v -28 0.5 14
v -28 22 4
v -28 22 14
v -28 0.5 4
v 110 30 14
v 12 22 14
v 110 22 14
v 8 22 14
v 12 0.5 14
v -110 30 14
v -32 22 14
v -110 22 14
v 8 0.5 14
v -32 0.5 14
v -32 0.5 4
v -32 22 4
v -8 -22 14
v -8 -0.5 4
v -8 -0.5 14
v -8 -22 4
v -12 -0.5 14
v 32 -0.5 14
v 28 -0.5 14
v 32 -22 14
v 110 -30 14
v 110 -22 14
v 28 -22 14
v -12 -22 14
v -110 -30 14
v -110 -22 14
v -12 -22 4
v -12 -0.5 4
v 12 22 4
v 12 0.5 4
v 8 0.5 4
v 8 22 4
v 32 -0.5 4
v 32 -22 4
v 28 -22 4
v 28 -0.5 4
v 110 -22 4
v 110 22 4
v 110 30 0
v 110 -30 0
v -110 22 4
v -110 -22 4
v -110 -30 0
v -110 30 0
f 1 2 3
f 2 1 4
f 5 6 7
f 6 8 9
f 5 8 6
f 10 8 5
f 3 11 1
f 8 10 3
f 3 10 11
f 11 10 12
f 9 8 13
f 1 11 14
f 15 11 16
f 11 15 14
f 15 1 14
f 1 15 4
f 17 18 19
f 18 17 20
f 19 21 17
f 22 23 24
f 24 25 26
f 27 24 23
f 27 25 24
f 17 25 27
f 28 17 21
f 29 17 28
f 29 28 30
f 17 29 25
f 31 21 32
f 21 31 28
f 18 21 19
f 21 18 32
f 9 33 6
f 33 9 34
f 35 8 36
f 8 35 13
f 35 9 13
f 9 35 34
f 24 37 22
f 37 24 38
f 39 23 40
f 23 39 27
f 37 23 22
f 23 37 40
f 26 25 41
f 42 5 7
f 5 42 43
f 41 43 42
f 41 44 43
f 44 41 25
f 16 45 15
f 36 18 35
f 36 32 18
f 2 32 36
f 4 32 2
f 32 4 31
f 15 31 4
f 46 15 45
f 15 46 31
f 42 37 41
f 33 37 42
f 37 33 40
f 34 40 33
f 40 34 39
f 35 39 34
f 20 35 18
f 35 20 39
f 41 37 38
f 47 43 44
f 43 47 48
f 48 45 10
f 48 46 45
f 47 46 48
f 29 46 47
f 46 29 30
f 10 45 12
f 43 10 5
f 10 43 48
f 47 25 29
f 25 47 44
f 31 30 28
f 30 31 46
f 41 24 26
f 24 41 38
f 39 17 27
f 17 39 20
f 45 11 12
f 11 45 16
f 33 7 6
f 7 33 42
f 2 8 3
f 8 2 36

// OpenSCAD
$fn = 32;

// ----------------------------------------------------------------------
// Rib frame 220 x 60 x 14
// 4 ribs at 20 mm pitch, staggered
// ----------------------------------------------------------------------

// --- parameters (mm) ---
frame = [220, 60, 4];  // base plate size (x, y, z)
rail_w = 8;            // side rail width
ribs = 4;              // number of ribs
rib_t = 4;             // rib thickness
rib_h = 10;            // rib height above the base plate
pitch = 20;            // pitch between rib centres

// --- derived feature positions (mm) ---
span = (ribs - 1) * pitch;          // = 60   distance between the outer ribs
origin_x = -span / 2;               // = -30   X of the first rib
rib_len = frame[1] / 2 - rail_w + 0.5;  // = 22.5   length of a staggered rib
rib_y = 0.5 + rib_len / 2;          // = 11.75   Y of a staggered rib centre
row_offset = 2 * rib_y;             // = 23.5   distance between the two rows
feature_centers = [
  [origin_x + 0 * pitch, rib_y],
  [origin_x + 1 * pitch, -rib_y],
  [origin_x + 2 * pitch, rib_y],
  [origin_x + 3 * pitch, -rib_y]
];   // rib centre line, drives the rib loop

// base plate, two side rails, then the ribs read straight off feature_centers
union() {
  translate([-frame[0] / 2, -frame[1] / 2, 0]) cube(frame);
  translate([-frame[0] / 2, -frame[1] / 2, 0]) cube([frame[0], rail_w, frame[2] + rib_h]);
  translate([-frame[0] / 2, frame[1] / 2 - rail_w, 0]) cube([frame[0], rail_w, frame[2] + rib_h]);
  for (centre = feature_centers)
    translate([centre[0] - rib_t / 2, centre[1] - rib_len / 2, frame[2] - 1])
      cube([rib_t, rib_len, rib_h + 1]);
}
